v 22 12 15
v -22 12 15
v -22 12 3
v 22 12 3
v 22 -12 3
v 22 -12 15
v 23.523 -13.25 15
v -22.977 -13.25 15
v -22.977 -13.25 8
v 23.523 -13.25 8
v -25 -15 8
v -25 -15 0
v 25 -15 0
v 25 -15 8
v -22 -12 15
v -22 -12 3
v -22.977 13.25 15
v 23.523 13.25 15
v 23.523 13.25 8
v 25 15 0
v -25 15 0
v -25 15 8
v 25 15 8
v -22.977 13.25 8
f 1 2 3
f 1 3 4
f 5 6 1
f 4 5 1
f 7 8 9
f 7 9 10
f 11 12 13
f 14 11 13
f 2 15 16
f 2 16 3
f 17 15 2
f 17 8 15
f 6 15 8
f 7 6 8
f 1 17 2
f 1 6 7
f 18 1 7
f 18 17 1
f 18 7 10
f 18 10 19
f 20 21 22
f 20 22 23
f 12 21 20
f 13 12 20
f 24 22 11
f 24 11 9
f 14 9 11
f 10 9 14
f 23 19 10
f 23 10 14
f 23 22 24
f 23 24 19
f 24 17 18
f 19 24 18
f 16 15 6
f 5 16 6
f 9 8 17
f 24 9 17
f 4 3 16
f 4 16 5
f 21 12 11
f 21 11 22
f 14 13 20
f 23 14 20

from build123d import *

# Parameters (mm, degrees)
SKETCH_W        = 50
SKETCH_H        = 30
PAD_DEPTH       = 15
SKETCH002_W     = 44
SKETCH002_H     = 24
POCKET_DEPTH    = 12
SKETCH003_W     = 52.437362
SKETCH003_H     = 33.156771
SKETCH003_W_2   = 46.5
SKETCH003_H_2   = 26.5
POCKET001_DEPTH = 7


with BuildPart() as part:
    # Sketch → Pad (new body)
    with BuildSketch(Plane.XY):
        Rectangle(SKETCH_W, SKETCH_H)
    extrude(amount=PAD_DEPTH)

    # Sketch002 (on Face6 of Pad) → Pocket (cut)
    with BuildSketch(Plane.XY.offset(15)):
        Rectangle(SKETCH002_W, SKETCH002_H)
    extrude(amount=-POCKET_DEPTH, mode=Mode.SUBTRACT)

    # Sketch003 (on Face5 of Pocket) → Pocket001 (cut)
    with BuildSketch(Plane.XY.offset(15)):
        with Locations((-0.04809, 0.412657)):
            Rectangle(SKETCH003_W, SKETCH003_H)
        with Locations((0.272907, 0)):
            Rectangle(SKETCH003_W_2, SKETCH003_H_2, mode=Mode.SUBTRACT)
    extrude(amount=-POCKET001_DEPTH, mode=Mode.SUBTRACT)


solid = part.part
